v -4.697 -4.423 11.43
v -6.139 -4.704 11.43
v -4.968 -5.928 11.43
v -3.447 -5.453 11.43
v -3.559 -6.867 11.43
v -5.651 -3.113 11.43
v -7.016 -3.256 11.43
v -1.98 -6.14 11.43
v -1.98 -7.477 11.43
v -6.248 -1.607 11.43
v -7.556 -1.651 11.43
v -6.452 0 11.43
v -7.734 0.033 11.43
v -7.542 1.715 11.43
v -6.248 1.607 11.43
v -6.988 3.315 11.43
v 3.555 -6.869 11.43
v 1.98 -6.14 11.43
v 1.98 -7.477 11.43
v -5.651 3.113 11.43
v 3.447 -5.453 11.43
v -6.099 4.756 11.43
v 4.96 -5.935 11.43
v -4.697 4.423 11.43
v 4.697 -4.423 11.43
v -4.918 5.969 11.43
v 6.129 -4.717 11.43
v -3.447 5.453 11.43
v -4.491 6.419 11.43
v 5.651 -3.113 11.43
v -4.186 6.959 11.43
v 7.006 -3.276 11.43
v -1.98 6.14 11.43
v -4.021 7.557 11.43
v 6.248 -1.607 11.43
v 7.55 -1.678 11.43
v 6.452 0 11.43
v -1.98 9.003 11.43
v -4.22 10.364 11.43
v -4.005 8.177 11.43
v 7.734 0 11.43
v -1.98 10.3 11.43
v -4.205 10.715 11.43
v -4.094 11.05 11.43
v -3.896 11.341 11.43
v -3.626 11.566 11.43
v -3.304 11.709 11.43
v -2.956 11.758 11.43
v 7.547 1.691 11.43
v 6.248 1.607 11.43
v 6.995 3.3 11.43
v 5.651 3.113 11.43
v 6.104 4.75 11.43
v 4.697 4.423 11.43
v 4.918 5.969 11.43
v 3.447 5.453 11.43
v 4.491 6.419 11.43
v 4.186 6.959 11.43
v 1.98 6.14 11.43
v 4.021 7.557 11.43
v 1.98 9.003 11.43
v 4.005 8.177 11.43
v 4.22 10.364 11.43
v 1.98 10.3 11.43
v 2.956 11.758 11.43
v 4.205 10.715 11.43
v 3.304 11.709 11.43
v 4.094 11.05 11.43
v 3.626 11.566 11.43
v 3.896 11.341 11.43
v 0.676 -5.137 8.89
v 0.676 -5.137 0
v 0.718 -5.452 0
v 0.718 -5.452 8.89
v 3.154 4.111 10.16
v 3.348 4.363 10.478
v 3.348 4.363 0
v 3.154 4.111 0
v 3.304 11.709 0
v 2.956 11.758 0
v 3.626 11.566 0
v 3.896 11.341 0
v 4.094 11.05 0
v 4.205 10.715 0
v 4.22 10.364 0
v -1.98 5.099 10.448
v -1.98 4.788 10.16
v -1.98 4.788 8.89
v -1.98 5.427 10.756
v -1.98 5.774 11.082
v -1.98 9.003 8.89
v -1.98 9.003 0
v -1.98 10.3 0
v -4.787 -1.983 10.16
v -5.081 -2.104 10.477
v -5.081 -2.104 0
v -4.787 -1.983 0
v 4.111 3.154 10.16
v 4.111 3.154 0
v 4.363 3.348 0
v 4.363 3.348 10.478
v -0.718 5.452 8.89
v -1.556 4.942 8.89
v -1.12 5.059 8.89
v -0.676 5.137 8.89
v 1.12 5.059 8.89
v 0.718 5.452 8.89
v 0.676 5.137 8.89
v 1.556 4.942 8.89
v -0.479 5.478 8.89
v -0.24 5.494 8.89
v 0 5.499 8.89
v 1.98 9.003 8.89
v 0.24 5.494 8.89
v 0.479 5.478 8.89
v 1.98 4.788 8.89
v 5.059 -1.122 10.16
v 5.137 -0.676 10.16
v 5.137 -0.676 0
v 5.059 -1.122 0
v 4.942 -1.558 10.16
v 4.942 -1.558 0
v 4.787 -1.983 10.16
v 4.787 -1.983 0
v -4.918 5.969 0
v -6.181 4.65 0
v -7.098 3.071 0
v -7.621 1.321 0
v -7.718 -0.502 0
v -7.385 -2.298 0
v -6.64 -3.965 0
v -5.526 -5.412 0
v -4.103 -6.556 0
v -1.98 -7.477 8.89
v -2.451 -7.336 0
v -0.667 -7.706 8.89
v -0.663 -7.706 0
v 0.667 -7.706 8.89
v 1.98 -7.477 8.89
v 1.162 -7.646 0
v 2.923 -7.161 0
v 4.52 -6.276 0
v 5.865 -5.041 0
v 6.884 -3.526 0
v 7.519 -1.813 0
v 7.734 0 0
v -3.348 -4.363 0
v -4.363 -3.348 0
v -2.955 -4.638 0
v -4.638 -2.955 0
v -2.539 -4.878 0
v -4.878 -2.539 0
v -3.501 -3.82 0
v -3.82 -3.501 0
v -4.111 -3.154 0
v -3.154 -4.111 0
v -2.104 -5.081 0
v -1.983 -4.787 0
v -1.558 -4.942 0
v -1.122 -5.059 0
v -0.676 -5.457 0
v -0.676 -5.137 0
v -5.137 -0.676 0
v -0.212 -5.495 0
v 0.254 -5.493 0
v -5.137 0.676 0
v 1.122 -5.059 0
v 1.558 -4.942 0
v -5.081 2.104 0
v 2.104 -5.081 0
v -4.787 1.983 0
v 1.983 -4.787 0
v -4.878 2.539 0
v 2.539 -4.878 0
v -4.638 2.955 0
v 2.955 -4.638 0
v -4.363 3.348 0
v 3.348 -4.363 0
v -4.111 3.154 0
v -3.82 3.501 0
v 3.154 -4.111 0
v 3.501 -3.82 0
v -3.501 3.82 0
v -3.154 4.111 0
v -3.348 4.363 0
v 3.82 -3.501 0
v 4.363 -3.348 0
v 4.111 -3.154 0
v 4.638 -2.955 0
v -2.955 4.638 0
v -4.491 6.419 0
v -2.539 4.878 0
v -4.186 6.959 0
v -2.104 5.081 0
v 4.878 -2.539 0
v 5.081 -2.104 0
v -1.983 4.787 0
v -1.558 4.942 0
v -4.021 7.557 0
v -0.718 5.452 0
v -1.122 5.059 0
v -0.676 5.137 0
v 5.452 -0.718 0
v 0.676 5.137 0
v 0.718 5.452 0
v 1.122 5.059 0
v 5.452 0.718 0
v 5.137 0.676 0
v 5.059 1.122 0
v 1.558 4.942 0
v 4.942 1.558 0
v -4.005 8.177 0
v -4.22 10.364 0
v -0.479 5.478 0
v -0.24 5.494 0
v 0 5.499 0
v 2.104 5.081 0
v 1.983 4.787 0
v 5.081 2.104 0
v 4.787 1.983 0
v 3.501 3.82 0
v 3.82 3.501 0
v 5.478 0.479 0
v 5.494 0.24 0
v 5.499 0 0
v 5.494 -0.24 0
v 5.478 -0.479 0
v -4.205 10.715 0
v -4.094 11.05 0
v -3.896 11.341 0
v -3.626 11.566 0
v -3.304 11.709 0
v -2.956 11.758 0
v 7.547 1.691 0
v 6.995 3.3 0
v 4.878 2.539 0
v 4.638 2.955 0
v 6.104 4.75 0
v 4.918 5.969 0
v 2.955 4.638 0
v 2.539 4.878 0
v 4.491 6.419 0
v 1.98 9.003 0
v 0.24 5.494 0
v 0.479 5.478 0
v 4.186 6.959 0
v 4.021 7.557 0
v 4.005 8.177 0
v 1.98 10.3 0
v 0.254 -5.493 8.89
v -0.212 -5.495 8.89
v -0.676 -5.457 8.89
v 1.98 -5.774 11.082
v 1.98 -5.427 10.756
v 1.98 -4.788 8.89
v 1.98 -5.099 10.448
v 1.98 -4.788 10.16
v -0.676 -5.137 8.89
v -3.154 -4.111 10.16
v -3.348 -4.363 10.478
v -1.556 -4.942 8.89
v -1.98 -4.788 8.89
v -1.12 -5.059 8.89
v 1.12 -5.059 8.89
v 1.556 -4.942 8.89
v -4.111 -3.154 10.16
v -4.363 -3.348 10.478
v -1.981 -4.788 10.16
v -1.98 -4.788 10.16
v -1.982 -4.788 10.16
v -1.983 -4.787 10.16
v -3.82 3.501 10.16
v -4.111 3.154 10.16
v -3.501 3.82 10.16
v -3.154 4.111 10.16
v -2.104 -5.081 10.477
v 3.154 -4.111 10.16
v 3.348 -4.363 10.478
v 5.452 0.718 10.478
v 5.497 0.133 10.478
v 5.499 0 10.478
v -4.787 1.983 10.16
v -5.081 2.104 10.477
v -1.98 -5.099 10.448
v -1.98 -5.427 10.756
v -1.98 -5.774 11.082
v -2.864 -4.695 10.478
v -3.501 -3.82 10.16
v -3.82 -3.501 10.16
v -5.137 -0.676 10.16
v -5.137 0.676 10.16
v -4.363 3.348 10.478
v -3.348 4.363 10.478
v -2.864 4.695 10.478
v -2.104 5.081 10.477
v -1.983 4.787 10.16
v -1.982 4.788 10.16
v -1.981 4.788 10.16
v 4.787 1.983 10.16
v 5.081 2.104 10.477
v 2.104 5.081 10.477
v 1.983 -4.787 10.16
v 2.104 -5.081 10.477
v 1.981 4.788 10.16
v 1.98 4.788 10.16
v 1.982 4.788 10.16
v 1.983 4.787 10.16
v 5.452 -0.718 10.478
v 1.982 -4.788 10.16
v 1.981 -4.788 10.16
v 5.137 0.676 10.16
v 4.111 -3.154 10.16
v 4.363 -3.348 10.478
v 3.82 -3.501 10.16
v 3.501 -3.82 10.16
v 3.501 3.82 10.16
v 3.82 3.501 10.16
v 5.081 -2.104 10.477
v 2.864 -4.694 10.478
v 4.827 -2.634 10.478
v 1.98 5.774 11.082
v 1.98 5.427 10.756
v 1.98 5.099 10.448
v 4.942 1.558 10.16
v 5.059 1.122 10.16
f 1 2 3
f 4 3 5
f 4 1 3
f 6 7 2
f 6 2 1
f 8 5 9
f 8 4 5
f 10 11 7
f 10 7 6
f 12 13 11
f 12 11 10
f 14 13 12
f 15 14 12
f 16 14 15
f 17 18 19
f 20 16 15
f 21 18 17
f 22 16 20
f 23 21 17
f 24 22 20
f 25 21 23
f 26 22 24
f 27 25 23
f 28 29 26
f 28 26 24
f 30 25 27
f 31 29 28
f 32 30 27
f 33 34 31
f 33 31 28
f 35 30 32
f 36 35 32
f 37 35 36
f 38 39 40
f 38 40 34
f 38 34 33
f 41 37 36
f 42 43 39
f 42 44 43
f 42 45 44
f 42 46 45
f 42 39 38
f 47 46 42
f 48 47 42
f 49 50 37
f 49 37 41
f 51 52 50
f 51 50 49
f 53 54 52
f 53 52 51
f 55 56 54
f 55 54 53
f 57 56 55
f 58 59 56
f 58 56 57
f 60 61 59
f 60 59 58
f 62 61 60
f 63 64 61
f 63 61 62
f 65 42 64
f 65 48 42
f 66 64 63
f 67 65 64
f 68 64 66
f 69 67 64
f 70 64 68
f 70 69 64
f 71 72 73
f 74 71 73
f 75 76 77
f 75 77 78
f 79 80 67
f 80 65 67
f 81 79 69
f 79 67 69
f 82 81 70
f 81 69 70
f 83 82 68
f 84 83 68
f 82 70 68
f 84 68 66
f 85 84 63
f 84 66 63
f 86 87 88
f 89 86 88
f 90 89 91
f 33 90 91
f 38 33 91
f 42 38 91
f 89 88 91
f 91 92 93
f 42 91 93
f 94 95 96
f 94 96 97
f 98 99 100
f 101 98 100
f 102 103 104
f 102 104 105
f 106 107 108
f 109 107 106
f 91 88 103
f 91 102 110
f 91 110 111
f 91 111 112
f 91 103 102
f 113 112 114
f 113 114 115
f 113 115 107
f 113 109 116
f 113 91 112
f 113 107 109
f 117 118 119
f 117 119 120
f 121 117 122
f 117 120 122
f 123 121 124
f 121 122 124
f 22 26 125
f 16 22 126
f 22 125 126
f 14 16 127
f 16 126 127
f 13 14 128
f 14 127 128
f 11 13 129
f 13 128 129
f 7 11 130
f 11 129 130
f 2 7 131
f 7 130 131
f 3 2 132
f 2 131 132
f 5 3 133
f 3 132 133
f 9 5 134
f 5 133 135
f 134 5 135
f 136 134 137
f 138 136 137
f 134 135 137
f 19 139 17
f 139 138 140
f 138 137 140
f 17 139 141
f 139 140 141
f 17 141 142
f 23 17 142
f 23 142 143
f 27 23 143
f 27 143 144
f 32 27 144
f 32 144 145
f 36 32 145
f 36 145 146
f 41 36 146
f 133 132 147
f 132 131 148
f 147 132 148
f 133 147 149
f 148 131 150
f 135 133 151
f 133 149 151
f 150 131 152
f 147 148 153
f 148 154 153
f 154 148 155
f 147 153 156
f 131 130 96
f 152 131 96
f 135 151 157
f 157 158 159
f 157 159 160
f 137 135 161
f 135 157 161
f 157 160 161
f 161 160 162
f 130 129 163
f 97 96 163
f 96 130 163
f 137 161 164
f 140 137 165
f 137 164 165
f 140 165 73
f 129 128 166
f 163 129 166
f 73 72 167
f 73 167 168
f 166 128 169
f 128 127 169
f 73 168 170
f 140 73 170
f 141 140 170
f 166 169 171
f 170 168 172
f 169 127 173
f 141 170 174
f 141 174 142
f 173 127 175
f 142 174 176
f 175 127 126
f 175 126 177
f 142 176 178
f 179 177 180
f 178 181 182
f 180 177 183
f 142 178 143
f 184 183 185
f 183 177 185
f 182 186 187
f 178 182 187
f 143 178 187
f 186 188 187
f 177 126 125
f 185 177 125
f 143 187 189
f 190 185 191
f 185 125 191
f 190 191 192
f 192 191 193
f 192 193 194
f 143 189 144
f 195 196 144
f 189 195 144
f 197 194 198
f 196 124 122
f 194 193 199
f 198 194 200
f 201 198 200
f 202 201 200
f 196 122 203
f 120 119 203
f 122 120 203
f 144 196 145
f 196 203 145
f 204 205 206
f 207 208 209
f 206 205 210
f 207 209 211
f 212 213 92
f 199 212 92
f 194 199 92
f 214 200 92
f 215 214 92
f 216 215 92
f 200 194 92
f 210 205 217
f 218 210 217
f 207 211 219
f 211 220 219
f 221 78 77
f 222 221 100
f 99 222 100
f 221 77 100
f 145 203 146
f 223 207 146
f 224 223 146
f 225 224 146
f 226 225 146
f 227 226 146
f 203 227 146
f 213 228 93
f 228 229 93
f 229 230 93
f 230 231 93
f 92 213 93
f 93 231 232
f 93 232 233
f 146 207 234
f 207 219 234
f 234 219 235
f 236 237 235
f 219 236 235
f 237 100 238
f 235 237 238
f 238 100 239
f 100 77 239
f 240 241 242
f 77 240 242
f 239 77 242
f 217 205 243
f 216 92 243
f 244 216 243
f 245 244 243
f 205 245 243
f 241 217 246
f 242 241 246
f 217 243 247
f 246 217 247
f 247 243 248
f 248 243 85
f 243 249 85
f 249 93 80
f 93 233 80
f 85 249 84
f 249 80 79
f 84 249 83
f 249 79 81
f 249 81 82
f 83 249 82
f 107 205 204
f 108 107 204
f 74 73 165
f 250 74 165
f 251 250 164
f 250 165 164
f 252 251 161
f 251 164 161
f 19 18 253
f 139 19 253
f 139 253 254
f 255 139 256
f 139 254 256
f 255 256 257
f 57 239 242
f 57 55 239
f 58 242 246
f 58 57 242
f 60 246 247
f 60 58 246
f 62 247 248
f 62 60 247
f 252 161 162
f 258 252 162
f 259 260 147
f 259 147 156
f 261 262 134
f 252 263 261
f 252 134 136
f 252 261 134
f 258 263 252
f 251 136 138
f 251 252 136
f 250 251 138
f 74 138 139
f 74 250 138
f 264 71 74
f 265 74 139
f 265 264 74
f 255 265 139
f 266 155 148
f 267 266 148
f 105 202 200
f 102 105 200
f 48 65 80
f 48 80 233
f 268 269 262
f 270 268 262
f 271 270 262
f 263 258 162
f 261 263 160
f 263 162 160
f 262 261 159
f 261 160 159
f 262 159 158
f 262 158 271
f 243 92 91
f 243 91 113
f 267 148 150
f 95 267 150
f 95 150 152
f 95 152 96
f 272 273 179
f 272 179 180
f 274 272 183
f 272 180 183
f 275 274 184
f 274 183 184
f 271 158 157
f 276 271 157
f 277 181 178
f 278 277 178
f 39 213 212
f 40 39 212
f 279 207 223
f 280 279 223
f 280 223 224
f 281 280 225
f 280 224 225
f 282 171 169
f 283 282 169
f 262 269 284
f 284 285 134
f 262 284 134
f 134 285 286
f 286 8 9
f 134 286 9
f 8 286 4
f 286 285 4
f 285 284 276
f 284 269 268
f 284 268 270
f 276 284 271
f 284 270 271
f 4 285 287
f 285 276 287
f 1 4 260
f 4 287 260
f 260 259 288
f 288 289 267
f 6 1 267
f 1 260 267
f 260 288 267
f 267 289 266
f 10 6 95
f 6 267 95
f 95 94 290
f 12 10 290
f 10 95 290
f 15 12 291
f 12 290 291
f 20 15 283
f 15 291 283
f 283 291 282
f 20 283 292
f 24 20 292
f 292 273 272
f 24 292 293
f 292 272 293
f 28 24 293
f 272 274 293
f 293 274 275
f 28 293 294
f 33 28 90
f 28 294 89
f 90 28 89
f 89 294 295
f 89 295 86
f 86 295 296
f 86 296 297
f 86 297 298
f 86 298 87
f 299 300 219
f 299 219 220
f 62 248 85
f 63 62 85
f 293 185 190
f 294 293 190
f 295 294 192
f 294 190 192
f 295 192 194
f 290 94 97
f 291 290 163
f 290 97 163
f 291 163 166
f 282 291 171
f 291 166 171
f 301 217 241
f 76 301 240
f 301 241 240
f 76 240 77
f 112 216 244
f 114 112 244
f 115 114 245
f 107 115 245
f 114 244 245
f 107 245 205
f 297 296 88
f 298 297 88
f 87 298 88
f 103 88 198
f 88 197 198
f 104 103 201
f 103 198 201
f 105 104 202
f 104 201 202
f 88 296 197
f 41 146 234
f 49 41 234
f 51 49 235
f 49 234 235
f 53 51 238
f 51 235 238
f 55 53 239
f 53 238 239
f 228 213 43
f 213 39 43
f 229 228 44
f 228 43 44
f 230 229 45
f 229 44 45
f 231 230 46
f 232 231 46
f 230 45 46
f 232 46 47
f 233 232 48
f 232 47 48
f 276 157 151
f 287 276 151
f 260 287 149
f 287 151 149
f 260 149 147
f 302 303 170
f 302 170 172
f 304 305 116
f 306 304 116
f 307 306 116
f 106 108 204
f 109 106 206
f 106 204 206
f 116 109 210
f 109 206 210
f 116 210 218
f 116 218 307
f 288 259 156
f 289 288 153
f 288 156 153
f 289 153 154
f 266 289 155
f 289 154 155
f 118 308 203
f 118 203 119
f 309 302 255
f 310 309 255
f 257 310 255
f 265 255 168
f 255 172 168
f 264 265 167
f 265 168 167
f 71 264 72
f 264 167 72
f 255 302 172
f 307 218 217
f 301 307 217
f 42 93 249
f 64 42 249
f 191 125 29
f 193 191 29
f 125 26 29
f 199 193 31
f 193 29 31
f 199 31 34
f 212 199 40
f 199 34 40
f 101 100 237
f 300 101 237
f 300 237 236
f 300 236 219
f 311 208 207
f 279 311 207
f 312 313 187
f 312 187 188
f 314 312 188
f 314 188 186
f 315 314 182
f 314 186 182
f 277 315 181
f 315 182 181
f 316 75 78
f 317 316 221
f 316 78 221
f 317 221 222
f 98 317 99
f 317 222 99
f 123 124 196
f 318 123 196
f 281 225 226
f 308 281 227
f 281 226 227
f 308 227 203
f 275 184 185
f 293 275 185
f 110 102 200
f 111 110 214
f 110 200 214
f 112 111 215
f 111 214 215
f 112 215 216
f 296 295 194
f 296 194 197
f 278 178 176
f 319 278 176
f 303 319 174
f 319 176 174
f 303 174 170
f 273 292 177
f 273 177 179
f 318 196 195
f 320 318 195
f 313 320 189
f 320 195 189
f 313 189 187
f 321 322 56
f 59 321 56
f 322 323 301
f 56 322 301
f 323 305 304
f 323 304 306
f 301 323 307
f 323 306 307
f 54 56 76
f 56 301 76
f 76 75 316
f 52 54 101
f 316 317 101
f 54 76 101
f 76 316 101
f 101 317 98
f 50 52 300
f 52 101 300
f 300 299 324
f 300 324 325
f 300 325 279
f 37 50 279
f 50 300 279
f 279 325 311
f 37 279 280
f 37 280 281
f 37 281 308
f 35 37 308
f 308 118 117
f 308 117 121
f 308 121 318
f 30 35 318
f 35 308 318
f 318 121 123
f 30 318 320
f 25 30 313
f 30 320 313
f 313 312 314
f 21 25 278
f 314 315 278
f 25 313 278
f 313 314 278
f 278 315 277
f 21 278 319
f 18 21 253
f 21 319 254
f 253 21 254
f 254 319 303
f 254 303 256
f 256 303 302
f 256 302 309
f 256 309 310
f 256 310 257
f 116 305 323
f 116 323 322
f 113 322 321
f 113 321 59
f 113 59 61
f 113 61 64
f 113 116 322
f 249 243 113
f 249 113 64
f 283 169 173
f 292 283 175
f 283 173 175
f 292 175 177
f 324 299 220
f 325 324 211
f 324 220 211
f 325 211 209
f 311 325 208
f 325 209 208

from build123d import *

# Parameters (mm, degrees)
F0_W         = 3.9597223513
F0_H         = 1.2967120856
F1_DEPTH     = 11.43
F2_R         = 2.54
F4_DEPTH     = 11.43
F5_DEPTH     = 2.54
F6_T2_ANGLE  = 117.2359685867
F6_T4_ANGLE  = 87.2295221482
F6_T6_ANGLE  = 87.2295221482
F6_T8_ANGLE  = 87.2295221482
F6_T10_ANGLE = 87.2295221482
F6_T12_ANGLE = 87.2295221482
F6_T14_ANGLE = 87.2295221482
F6_T16_ANGLE = 72.2652313511
F6_T18_ANGLE = 72.2652313511
F6_T20_ANGLE = 72.2652313511
F6_T22_ANGLE = 72.2652313511
F7_R         = 1.27


# Not quite as in the source:
# - a fillet or chamfer that OpenCascade refuses, or shapes differently, is made with other operations: its cross-section is extruded or revolved along the edge and cut away or added
# - a feature names something its author has since deleted; it is built from what else it names


with BuildPart() as f1:
    # F0 (on Top) → F1 (new body)
    with BuildSketch(Plane.XY):
        with BuildLine():
            ThreePointArc((-3.8608, 6.7017624436), (-3.8703236977, -6.6962669425), (7.7343, 0))
            ThreePointArc((7.7343, 0), (6.6962669425, 3.8703236977), (3.8608, 6.7017624436))
            ThreePointArc((3.8608, 6.7017624436), (1.9982436316, 7.4717078957), (0, 7.7343))
            ThreePointArc((0, 7.7343), (-1.9982436316, 7.4717078957), (-3.8608, 6.7017624436))
        make_face()
        with BuildLine():
            ThreePointArc((-0.7177765836, 5.4520544372), (-0.3596583479, 5.4873260048), (0, 5.4991))
            ThreePointArc((0, 5.4991), (0.3596583479, 5.4873260048), (0.7177765836, 5.4520544372))
            ThreePointArc((0.7177765836, 5.4520544372), (1.4232718109, 5.3117227113), (2.1044144629, 5.0805059372))
            ThreePointArc((2.1044144629, 5.0805059372), (2.74955, 4.762360298), (3.3476399743, 4.3627293536))
            ThreePointArc((3.3476399743, 4.3627293536), (3.8884509004, 3.8884509004), (4.3627293536, 3.3476399743))
            ThreePointArc((4.3627293536, 3.3476399743), (4.762360298, 2.74955), (5.0805059372, 2.1044144629))
            ThreePointArc((5.0805059372, 2.1044144629), (5.3117227113, 1.4232718109), (5.4520544372, 0.7177765836))
            ThreePointArc((5.4520544372, 0.7177765836), (5.4873260048, 0.3596583479), (5.4991, 0))
            ThreePointArc((5.4991, 0), (5.4873260048, -0.3596583479), (5.4520544372, -0.7177765836))
            ThreePointArc((5.4520544372, -0.7177765836), (5.3117227113, -1.4232718109), (5.0805059372, -2.1044144629))
            ThreePointArc((5.0805059372, -2.1044144629), (4.762360298, -2.74955), (4.3627293536, -3.3476399743))
            ThreePointArc((4.3627293536, -3.3476399743), (3.8884509004, -3.8884509004), (3.3476399743, -4.3627293536))
            ThreePointArc((3.3476399743, -4.3627293536), (2.74955, -4.762360298), (2.1044144629, -5.0805059372))
            ThreePointArc((2.1044144629, -5.0805059372), (1.4232718109, -5.3117227113), (0.7177765836, -5.4520544372))
            ThreePointArc((0.7177765836, -5.4520544372), (0.0208895376, -5.4990603231), (-0.6763345176, -5.4573503122))
            ThreePointArc((-0.6763345176, -5.4573503122), (-1.4030837979, -5.3170909966), (-2.1044144629, -5.0805059372))
            ThreePointArc((-2.1044144629, -5.0805059372), (-2.74955, -4.762360298), (-3.3476399743, -4.3627293536))
            ThreePointArc((-3.3476399743, -4.3627293536), (-3.8884509004, -3.8884509004), (-4.3627293536, -3.3476399743))
            ThreePointArc((-4.3627293536, -3.3476399743), (-4.762360298, -2.74955), (-5.0805059372, -2.1044144629))
            ThreePointArc((-5.0805059372, -2.1044144629), (-5.4991, 0), (-5.0805059372, 2.1044144629))
            ThreePointArc((-5.0805059372, 2.1044144629), (-4.762360298, 2.74955), (-4.3627293536, 3.3476399743))
            ThreePointArc((-4.3627293536, 3.3476399743), (-3.8884509004, 3.8884509004), (-3.3476399743, 4.3627293536))
            ThreePointArc((-3.3476399743, 4.3627293536), (-2.74955, 4.762360298), (-2.1044144629, 5.0805059372))
            ThreePointArc((-2.1044144629, 5.0805059372), (-1.4232718109, 5.3117227113), (-0.7177765836, 5.4520544372))
        make_face(mode=Mode.SUBTRACT)
        with BuildLine():
            ThreePointArc((0, 7.7343), (1.9982436316, 7.4717078957), (3.8608, 6.7017624436))
            Line((3.8608, 6.7017624436), (4.3561, 11.75755891))
            Line((4.3561, 11.75755891), (-4.3561, 11.75755891))
            Line((-4.3561, 11.75755891), (-3.8608, 6.7017624436))
            ThreePointArc((-3.8608, 6.7017624436), (-1.9982436316, 7.4717078957), (0, 7.7343))
        make_face()
        with Locations((0, 9.6516758204)):
            Rectangle(F0_W, F0_H, mode=Mode.SUBTRACT)
    extrude(amount=F1_DEPTH)

    # F2
    f2_edges = [f1.edges().sort_by_distance(p)[0] for p in [
        (3.8608, 6.701762, 5.715),
        (-3.8608, 6.701762, 5.715),
    ]]
    fillet(f2_edges, radius=F2_R)

    # F0 (on Top) → F4 (join)
    with BuildSketch(Plane.XY):
        with BuildLine():
            Line((-4.3627293536, 3.3476399743), (-4.1108396681, 3.1543582206))
            ThreePointArc((-4.1108396681, 3.1543582206), (-3.6639444974, 3.6639444974), (-3.1543582206, 4.1108396681))
            Line((-3.1543582206, 4.1108396681), (-3.3476399743, 4.3627293536))
            ThreePointArc((-3.3476399743, 4.3627293536), (-3.8884509004, 3.8884509004), (-4.3627293536, 3.3476399743))
        make_face()
        with BuildLine():
            Line((-0.6763345176, 5.1372706937), (-0.7177765836, 5.4520544372))
            ThreePointArc((-0.7177765836, 5.4520544372), (-1.4232718109, 5.3117227113), (-2.1044144629, 5.0805059372))
            Line((-2.1044144629, 5.0805059372), (-1.9829124731, 4.7871741857))
            ThreePointArc((-1.9829124731, 4.7871741857), (-1.3410967641, 5.0050412615), (-0.6763345176, 5.1372706937))
        make_face()
        with BuildLine():
            ThreePointArc((2.1044144629, 5.0805059372), (1.4232718109, 5.3117227113), (0.7177765836, 5.4520544372))
            Line((0.7177765836, 5.4520544372), (0.6763345176, 5.1372706937))
            ThreePointArc((0.6763345176, 5.1372706937), (1.3410967641, 5.0050412615), (1.9829124731, 4.7871741857))
            Line((1.9829124731, 4.7871741857), (2.1044144629, 5.0805059372))
        make_face()
        with BuildLine():
            Line((3.3476399743, 4.3627293536), (3.1543582206, 4.1108396681))
            ThreePointArc((3.1543582206, 4.1108396681), (3.6639444974, 3.6639444974), (4.1108396681, 3.1543582206))
            Line((4.1108396681, 3.1543582206), (4.3627293536, 3.3476399743))
            ThreePointArc((4.3627293536, 3.3476399743), (3.8884509004, 3.8884509004), (3.3476399743, 4.3627293536))
        make_face()
        with BuildLine():
            ThreePointArc((4.7871741857, 1.9829124731), (5.0050412615, 1.3410967641), (5.1372706937, 0.6763345176))
            Line((5.1372706937, 0.6763345176), (5.4520544372, 0.7177765836))
            ThreePointArc((5.4520544372, 0.7177765836), (5.3117227113, 1.4232718109), (5.0805059372, 2.1044144629))
            Line((5.0805059372, 2.1044144629), (4.7871741857, 1.9829124731))
        make_face()
        with BuildLine():
            ThreePointArc((-4.7871741857, -1.9829124731), (-5.1816, 0), (-4.7871741857, 1.9829124731))
            Line((-4.7871741857, 1.9829124731), (-5.0805059372, 2.1044144629))
            ThreePointArc((-5.0805059372, 2.1044144629), (-5.4991, 0), (-5.0805059372, -2.1044144629))
            Line((-5.0805059372, -2.1044144629), (-4.7871741857, -1.9829124731))
        make_face()
        with BuildLine():
            ThreePointArc((-3.1543582206, -4.1108396681), (-3.6639444974, -3.6639444974), (-4.1108396681, -3.1543582206))
            Line((-4.1108396681, -3.1543582206), (-4.3627293536, -3.3476399743))
            ThreePointArc((-4.3627293536, -3.3476399743), (-3.8884509004, -3.8884509004), (-3.3476399743, -4.3627293536))
            Line((-3.3476399743, -4.3627293536), (-3.1543582206, -4.1108396681))
        make_face()
        with BuildLine():
            ThreePointArc((-0.6763345176, -5.1372706937), (-1.3410967641, -5.0050412615), (-1.9829124731, -4.7871741857))
            Line((-1.9829124731, -4.7871741857), (-2.1044144629, -5.0805059372))
            ThreePointArc((-2.1044144629, -5.0805059372), (-1.4030837979, -5.3170909966), (-0.6763345176, -5.4573503122))
            Line((-0.6763345176, -5.4573503122), (-0.6763345176, -5.1372706937))
        make_face()
        with BuildLine():
            ThreePointArc((1.9829124731, -4.7871741857), (1.3410967641, -5.0050412615), (0.6763345176, -5.1372706937))
            Line((0.6763345176, -5.1372706937), (0.7177765836, -5.4520544372))
            ThreePointArc((0.7177765836, -5.4520544372), (1.4232718109, -5.3117227113), (2.1044144629, -5.0805059372))
            Line((2.1044144629, -5.0805059372), (1.9829124731, -4.7871741857))
        make_face()
        with BuildLine():
            ThreePointArc((4.1108396681, -3.1543582206), (3.6639444974, -3.6639444974), (3.1543582206, -4.1108396681))
            Line((3.1543582206, -4.1108396681), (3.3476399743, -4.3627293536))
            ThreePointArc((3.3476399743, -4.3627293536), (3.8884509004, -3.8884509004), (4.3627293536, -3.3476399743))
            Line((4.3627293536, -3.3476399743), (4.1108396681, -3.1543582206))
        make_face()
        with BuildLine():
            ThreePointArc((5.1372706937, -0.6763345176), (5.0050412615, -1.3410967641), (4.7871741857, -1.9829124731))
            Line((4.7871741857, -1.9829124731), (5.0805059372, -2.1044144629))
            ThreePointArc((5.0805059372, -2.1044144629), (5.3117227113, -1.4232718109), (5.4520544372, -0.7177765836))
            Line((5.4520544372, -0.7177765836), (5.1372706937, -0.6763345176))
        make_face()
    extrude(amount=F4_DEPTH)

    # F3 (on face) → F5 (cut)
    with BuildSketch(Plane.XY.offset(11.43)):
        with BuildLine():
            Line((1.9798611756, 5.1303265525), (1.9798611756, 9.0033197775))
            Line((1.9798611756, 9.0033197775), (-1.9798611756, 9.0033197775))
            Line((-1.9798611756, 9.0033197775), (-1.9798611756, 5.1303265525))
            ThreePointArc((-1.9798611756, 5.1303265525), (0, 5.4991), (1.9798611756, 5.1303265525))
        make_face()
        with BuildLine():
            Line((1.9798611756, -5.1303265525), (1.9798611756, 5.1303265525))
            ThreePointArc((1.9798611756, 5.1303265525), (0, 5.4991), (-1.9798611756, 5.1303265525))
            Line((-1.9798611756, 5.1303265525), (-1.9798611756, -5.1303265525))
            ThreePointArc((-1.9798611756, -5.1303265525), (0, -5.4991), (1.9798611756, -5.1303265525))
        make_face()
        with BuildLine():
            Line((1.9798611756, -7.4765999101), (1.9798611756, -5.1303265525))
            ThreePointArc((1.9798611756, -5.1303265525), (0, -5.4991), (-1.9798611756, -5.1303265525))
            Line((-1.9798611756, -5.1303265525), (-1.9798611756, -7.4765999101))
            ThreePointArc((-1.9798611756, -7.4765999101), (0, -7.7343), (1.9798611756, -7.4765999101))
        make_face()
    extrude(amount=-F5_DEPTH, mode=Mode.SUBTRACT)

    # F6: chamfer of 1.27 on 11 edges, made by hand

    # F6_s1 → F6_t2 (revolve, cut)
    with BuildSketch(Plane(origin=(0, 0, 0), x_dir=(0, 0, 1), z_dir=(0.8537142924, -0.5207416893, 0))):
        Polygon((11.43, 6.4516), (10.16, 5.1816), (11.43, 5.1816), align=None)
    revolve(axis=Axis((0, 0, 11.43), (0, 0, -1)), revolution_arc=F6_T2_ANGLE, mode=Mode.SUBTRACT)

    # F6_s3 → F6_t4 (revolve, cut)
    with BuildSketch(Plane(origin=(0, 0, 0), x_dir=(0, 0, 1), z_dir=(0.9997077511, -0.0241746249, 0))):
        Polygon((11.43, 6.4516), (10.16, 5.1816), (11.43, 5.1816), align=None)
    revolve(axis=Axis((0, 0, 11.43), (0, 0, -1)), revolution_arc=F6_T4_ANGLE, mode=Mode.SUBTRACT)

    # F6_s5 → F6_t6 (revolve, cut)
    with BuildSketch(Plane(origin=(0, 0, 0), x_dir=(0, 0, 1), z_dir=(-0.0241746249, -0.9997077511, 0))):
        Polygon((11.43, 6.4516), (10.16, 5.1816), (11.43, 5.1816), align=None)
    revolve(axis=Axis((0, 0, 11.43), (0, 0, -1)), revolution_arc=F6_T6_ANGLE, mode=Mode.SUBTRACT)

    # F6_s7 → F6_t8 (revolve, cut)
    with BuildSketch(Plane(origin=(0, 0, 0), x_dir=(0, 0, 1), z_dir=(-0.9997077511, 0.0241746249, 0))):
        Polygon((11.43, 6.4516), (10.16, 5.1816), (11.43, 5.1816), align=None)
    revolve(axis=Axis((0, 0, 11.43), (0, 0, -1)), revolution_arc=F6_T8_ANGLE, mode=Mode.SUBTRACT)

    # F6_s9 → F6_t10 (revolve, cut)
    with BuildSketch(Plane(origin=(0, 0, 0), x_dir=(0, 0, 1), z_dir=(-0.8536849963, 0.5207897148, 0))):
        Polygon((11.43, 6.4516), (10.16, 5.1816), (11.43, 5.1816), align=None)
    revolve(axis=Axis((0, 0, 11.43), (0, 0, -1)), revolution_arc=F6_T10_ANGLE, mode=Mode.SUBTRACT)

    # F6_s11 → F6_t12 (revolve, cut)
    with BuildSketch(Plane(origin=(0, 0, 0), x_dir=(0, 0, 1), z_dir=(-0.4789180362, 0.8778596212, 0))):
        Polygon((11.43, 6.4516), (10.16, 5.1816), (11.43, 5.1816), align=None)
    revolve(axis=Axis((0, 0, 11.43), (0, 0, -1)), revolution_arc=F6_T12_ANGLE, mode=Mode.SUBTRACT)

    # F6_s13 → F6_t14 (revolve, cut)
    with BuildSketch(Plane(origin=(0, 0, 0), x_dir=(0, 0, 1), z_dir=(0.0241746249, 0.9997077511, 0))):
        Polygon((11.43, 6.4516), (10.16, 5.1816), (11.43, 5.1816), align=None)
    revolve(axis=Axis((0, 0, 11.43), (0, 0, -1)), revolution_arc=F6_T14_ANGLE, mode=Mode.SUBTRACT)

    # F6_s15 → F6_t16 (revolve, cut)
    with BuildSketch(Plane(origin=(0, 0, 0), x_dir=(0, 0, 1), z_dir=(0.9717518339, 0.2360050283, 0))):
        Polygon((11.43, 6.4516), (10.16, 5.1816), (11.43, 5.1816), align=None)
    revolve(axis=Axis((0, 0, 11.43), (0, 0, -1)), revolution_arc=F6_T16_ANGLE, mode=Mode.SUBTRACT)

    # F6_s17 → F6_t18 (revolve, cut)
    with BuildSketch(Plane(origin=(0, 0, 0), x_dir=(0, 0, 1), z_dir=(-0.5207957174, -0.8536813344, 0))):
        Polygon((11.43, 6.4516), (10.16, 5.1816), (11.43, 5.1816), align=None)
    revolve(axis=Axis((0, 0, 11.43), (0, 0, -1)), revolution_arc=F6_T18_ANGLE, mode=Mode.SUBTRACT)

    # F6_s19 → F6_t20 (revolve, cut)
    with BuildSketch(Plane(origin=(0, 0, 0), x_dir=(0, 0, 1), z_dir=(-0.9717518339, -0.2360050283, 0))):
        Polygon((11.43, 6.4516), (10.16, 5.1816), (11.43, 5.1816), align=None)
    revolve(axis=Axis((0, 0, 11.43), (0, 0, -1)), revolution_arc=F6_T20_ANGLE, mode=Mode.SUBTRACT)

    # F6_s21 → F6_t22 (revolve, cut)
    with BuildSketch(Plane(origin=(0, 0, 0), x_dir=(0, 0, 1), z_dir=(0.5207957174, 0.8536813344, 0))):
        Polygon((11.43, 6.4516), (10.16, 5.1816), (11.43, 5.1816), align=None)
    revolve(axis=Axis((0, 0, 11.43), (0, 0, -1)), revolution_arc=F6_T22_ANGLE, mode=Mode.SUBTRACT)

    # F7
    f7_edges = [f1.edges().sort_by_distance(p)[0] for p in [
        (-4.3561, 11.757559, 5.715),
        (4.3561, 11.757559, 5.715),
    ]]
    fillet(f7_edges, radius=F7_R)


solid = f1.part
